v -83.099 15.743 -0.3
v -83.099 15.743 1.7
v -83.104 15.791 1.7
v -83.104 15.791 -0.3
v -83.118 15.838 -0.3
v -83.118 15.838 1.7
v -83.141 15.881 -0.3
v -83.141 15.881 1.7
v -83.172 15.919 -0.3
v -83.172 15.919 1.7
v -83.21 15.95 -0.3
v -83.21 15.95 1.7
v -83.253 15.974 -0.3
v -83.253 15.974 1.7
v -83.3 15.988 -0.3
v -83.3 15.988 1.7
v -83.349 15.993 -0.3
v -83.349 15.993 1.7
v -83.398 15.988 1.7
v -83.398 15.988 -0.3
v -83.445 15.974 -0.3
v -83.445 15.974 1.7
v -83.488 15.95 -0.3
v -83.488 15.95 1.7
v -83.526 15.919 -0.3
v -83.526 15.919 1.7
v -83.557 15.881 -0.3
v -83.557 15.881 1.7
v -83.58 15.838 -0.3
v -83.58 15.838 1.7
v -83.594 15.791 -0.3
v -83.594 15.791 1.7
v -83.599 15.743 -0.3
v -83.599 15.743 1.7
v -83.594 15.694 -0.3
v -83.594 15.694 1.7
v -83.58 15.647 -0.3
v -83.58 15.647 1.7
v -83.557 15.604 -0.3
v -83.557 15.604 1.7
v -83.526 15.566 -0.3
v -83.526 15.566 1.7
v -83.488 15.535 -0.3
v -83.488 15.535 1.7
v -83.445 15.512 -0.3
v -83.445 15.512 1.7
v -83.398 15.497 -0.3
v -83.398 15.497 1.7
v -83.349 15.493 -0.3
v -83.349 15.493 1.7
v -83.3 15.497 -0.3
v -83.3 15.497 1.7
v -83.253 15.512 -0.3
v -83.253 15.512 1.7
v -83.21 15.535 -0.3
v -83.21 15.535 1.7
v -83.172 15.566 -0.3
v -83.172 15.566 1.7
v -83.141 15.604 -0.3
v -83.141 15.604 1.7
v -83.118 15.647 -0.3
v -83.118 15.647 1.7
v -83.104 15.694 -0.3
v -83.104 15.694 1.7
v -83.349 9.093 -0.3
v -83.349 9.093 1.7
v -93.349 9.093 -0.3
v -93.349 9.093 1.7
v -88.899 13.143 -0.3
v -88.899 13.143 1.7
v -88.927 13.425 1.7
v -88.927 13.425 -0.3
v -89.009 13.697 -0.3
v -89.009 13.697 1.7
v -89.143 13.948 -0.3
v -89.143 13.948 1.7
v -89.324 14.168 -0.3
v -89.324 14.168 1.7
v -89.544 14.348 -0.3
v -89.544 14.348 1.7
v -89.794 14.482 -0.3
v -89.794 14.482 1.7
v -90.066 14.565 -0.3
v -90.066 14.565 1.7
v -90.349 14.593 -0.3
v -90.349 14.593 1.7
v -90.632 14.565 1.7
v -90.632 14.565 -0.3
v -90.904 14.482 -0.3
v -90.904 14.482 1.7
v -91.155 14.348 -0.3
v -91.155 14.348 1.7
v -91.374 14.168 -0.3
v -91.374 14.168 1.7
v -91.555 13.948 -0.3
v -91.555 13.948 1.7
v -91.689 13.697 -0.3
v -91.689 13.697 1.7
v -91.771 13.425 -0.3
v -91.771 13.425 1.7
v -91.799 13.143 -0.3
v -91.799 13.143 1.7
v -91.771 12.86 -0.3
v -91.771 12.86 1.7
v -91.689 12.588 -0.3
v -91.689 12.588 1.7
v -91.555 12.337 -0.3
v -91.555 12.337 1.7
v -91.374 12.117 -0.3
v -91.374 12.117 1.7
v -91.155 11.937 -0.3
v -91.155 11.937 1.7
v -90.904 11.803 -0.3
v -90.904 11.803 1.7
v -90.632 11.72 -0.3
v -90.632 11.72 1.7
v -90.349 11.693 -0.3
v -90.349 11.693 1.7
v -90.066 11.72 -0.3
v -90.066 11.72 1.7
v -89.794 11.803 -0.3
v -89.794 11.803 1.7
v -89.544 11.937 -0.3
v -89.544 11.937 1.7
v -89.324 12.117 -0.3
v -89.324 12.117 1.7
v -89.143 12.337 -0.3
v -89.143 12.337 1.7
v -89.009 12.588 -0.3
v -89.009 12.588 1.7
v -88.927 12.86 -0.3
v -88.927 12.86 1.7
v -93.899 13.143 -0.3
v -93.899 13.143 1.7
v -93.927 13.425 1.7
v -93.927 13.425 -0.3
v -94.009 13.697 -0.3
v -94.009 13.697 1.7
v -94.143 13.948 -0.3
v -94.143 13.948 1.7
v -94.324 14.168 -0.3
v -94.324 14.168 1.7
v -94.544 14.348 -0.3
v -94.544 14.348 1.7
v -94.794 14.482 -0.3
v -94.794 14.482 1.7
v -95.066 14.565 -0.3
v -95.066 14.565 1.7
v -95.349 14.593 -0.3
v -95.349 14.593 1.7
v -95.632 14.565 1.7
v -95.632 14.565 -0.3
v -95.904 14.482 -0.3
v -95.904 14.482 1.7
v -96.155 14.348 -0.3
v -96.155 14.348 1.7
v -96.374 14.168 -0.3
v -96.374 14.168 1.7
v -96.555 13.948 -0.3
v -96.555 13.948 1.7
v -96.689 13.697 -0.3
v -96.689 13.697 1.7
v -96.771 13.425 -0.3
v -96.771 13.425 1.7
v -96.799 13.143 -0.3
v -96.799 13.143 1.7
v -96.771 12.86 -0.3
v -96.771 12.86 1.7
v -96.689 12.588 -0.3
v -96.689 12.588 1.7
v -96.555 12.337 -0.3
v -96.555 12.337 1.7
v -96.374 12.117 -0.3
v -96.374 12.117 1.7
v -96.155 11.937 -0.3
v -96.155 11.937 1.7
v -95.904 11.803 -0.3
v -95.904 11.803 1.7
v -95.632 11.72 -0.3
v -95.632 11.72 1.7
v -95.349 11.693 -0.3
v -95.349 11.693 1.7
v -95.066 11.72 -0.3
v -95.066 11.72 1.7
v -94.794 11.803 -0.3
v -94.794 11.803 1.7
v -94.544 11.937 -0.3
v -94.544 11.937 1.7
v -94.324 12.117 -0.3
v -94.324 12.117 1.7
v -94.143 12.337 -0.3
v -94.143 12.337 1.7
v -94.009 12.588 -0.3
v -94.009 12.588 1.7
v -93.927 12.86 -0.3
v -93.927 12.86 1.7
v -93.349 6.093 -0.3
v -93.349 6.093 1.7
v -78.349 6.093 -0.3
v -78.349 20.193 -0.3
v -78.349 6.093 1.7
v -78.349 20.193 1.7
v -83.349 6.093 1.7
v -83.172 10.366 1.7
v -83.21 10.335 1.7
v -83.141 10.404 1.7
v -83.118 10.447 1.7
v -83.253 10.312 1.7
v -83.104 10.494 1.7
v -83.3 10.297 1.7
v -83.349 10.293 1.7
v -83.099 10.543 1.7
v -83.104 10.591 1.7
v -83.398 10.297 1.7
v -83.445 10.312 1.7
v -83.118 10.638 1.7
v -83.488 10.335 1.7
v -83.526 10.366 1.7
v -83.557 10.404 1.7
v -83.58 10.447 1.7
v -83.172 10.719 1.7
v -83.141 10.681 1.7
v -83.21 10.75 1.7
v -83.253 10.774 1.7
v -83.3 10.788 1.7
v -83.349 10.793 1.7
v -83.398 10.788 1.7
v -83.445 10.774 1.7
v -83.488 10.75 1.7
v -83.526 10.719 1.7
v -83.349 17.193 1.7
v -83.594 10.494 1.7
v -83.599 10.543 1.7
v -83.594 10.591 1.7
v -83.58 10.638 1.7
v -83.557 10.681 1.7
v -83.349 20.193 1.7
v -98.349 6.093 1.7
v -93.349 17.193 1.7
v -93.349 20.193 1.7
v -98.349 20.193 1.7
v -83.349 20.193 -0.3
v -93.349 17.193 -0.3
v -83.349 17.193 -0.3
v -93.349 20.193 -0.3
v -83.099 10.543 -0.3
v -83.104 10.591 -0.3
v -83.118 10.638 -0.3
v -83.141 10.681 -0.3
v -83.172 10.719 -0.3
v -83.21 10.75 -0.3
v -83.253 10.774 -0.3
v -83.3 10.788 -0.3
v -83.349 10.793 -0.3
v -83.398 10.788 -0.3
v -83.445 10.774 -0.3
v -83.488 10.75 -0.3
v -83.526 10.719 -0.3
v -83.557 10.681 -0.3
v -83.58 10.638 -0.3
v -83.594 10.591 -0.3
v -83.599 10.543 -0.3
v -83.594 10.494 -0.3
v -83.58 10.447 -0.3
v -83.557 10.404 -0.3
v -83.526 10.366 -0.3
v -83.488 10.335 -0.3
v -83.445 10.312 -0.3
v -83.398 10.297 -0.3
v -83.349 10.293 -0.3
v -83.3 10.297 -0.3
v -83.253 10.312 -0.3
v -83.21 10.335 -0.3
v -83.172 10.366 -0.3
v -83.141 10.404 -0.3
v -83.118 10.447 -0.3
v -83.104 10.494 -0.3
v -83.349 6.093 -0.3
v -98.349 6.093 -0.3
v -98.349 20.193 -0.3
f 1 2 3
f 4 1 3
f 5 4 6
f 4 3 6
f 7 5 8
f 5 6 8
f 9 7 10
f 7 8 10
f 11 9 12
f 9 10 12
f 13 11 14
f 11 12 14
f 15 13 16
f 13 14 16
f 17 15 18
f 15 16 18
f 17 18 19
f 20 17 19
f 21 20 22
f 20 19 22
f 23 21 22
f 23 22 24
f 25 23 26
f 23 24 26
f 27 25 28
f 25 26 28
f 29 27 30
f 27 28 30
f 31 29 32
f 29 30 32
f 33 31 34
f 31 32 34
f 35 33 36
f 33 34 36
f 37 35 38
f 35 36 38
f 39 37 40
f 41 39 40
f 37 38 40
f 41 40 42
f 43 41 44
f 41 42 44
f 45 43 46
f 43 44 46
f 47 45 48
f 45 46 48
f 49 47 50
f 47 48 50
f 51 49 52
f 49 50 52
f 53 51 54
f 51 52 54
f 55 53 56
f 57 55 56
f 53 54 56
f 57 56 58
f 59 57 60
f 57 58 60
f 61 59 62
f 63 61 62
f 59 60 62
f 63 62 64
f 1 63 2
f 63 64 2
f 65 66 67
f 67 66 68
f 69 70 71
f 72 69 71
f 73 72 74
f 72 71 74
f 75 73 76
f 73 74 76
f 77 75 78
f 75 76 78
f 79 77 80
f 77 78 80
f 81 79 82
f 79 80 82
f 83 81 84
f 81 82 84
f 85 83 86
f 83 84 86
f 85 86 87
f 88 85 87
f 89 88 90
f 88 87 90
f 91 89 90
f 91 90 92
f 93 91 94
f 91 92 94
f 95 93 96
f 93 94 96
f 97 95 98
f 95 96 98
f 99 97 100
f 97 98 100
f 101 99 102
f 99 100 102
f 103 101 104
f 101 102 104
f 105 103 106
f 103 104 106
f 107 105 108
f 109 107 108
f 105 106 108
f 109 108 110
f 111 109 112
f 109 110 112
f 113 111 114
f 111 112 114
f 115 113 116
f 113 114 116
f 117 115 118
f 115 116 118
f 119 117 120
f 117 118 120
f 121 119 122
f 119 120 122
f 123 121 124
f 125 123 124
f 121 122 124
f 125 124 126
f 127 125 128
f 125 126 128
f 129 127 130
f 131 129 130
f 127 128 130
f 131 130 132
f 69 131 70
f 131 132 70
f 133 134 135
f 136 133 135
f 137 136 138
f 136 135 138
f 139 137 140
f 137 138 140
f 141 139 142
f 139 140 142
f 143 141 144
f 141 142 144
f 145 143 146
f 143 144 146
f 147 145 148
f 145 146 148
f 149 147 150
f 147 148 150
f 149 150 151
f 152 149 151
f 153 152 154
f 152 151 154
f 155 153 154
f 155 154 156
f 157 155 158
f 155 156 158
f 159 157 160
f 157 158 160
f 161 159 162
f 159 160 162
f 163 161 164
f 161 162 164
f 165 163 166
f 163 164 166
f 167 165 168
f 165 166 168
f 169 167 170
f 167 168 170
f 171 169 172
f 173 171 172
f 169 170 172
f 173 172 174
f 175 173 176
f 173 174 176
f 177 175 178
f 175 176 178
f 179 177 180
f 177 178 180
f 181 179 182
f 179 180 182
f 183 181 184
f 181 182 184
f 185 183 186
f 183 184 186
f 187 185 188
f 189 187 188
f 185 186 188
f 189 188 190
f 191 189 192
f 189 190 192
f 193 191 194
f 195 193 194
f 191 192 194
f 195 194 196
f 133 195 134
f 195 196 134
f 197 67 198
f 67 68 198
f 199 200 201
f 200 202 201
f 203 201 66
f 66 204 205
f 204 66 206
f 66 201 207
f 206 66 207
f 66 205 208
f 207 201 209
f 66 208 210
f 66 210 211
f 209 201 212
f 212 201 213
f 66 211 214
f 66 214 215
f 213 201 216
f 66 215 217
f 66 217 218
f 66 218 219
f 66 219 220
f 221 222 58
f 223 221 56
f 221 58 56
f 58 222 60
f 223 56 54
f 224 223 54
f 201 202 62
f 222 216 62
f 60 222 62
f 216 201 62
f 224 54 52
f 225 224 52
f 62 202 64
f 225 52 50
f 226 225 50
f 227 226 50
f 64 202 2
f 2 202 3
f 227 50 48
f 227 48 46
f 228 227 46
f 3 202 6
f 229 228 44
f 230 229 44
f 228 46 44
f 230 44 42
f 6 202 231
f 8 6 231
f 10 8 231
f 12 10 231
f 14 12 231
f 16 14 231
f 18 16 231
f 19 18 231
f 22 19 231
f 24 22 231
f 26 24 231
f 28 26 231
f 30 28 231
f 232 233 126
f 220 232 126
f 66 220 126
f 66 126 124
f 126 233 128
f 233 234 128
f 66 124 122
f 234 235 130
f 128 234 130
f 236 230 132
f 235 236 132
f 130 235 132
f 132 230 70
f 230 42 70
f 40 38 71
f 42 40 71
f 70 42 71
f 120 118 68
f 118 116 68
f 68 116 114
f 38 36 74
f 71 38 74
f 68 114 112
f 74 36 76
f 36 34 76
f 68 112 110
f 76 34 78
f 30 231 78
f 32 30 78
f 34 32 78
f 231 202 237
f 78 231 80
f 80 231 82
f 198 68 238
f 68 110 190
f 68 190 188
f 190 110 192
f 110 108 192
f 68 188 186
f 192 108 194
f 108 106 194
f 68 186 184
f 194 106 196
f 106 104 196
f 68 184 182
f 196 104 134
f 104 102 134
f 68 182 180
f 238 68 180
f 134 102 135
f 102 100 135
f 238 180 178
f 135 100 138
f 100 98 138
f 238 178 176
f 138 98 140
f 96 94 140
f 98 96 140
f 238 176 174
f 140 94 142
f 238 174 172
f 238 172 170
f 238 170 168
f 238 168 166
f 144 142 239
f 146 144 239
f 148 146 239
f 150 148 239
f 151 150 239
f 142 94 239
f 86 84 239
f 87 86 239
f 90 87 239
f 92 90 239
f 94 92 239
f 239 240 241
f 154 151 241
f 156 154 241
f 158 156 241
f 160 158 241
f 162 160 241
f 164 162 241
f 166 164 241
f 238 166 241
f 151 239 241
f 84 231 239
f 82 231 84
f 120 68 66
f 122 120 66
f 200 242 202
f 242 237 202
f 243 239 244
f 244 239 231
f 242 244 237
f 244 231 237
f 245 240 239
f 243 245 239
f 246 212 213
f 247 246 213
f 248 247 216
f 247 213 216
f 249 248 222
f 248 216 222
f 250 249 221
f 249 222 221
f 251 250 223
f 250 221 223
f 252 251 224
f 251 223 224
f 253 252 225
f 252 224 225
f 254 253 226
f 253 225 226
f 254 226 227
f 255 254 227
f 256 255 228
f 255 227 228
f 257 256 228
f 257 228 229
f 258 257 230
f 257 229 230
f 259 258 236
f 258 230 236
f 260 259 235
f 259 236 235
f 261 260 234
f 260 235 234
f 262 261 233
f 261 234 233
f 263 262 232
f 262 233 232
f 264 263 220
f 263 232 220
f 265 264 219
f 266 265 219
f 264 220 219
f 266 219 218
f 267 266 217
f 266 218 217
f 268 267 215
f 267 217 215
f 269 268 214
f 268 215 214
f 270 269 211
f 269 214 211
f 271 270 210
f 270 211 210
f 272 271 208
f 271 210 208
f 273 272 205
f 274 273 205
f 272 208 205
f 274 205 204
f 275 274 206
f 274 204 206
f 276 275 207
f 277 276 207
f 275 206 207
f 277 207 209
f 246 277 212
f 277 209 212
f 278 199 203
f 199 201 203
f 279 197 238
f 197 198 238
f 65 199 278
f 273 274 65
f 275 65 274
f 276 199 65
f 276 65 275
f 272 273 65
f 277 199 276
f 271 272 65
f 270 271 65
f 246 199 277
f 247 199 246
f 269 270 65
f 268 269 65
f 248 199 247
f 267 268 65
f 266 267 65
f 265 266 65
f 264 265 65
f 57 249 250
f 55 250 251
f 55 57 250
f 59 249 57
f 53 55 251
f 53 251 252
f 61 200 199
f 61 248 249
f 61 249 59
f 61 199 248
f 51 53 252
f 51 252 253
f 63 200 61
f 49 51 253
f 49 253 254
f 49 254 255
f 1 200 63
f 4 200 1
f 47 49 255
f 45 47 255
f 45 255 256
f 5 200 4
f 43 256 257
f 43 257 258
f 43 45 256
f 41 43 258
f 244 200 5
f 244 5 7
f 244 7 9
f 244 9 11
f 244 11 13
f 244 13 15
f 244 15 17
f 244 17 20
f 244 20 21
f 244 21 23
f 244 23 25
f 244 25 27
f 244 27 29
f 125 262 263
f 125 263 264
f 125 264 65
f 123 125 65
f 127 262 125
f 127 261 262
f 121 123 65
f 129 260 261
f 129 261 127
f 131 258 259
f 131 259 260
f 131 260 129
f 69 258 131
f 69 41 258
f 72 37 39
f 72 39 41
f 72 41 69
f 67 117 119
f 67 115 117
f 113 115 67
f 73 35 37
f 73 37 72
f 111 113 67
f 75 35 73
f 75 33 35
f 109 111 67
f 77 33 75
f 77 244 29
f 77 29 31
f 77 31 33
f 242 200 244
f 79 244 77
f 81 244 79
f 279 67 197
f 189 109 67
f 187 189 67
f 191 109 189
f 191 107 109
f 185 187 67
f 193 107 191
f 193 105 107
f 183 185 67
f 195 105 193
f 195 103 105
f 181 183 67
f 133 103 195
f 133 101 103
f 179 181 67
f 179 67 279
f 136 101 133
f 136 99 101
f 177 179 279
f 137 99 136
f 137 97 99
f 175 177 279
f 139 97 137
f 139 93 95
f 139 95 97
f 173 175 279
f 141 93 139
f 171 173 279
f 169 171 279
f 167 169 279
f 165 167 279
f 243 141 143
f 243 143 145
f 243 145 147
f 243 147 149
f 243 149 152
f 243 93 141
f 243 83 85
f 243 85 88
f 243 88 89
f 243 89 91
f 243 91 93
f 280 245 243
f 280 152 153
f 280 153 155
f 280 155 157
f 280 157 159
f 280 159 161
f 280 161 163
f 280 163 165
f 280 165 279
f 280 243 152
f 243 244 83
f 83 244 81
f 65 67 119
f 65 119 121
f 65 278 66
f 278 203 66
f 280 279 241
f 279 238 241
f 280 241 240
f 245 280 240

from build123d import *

# Parameters (mm, degrees)
BOSS_EXTRUDE1_DEPTH = 1.7
BOSS_EXTRUDE4_DEPTH = 0.3
SKETCH6_R           = 1.45
CUT_EXTRUDE1_DEPTH  = 2
SKETCH7_R           = 1.45
CUT_EXTRUDE2_DEPTH  = 2
SKETCH8_R           = 0.25
CUT_EXTRUDE3_DEPTH  = 2
SKETCH9_R           = 0.25
CUT_EXTRUDE4_DEPTH  = 2


with BuildPart() as part:
    # Sketch1 → Boss-Extrude1 (new body)
    with BuildSketch(Plane.XY):
        Polygon((-93.349083219, 17.192602894), (-83.349083219, 17.192602894), (-83.349083219, 20.192602894), (-78.349083219, 20.192602894), (-78.349083219, 6.092602894), (-83.349083219, 6.092602894), (-83.349083219, 9.092602894), (-93.349083219, 9.092602894), (-93.349083219, 6.092602894), (-98.349083219, 6.092602894), (-98.349083219, 20.192602894), (-93.349083219, 20.192602894), align=None)
    extrude(amount=BOSS_EXTRUDE1_DEPTH)

    # Sketch1<4> → Boss-Extrude4 (add)
    with BuildSketch(Plane.XY):
        Polygon((-93.349083219, 17.192602894), (-83.349083219, 17.192602894), (-83.349083219, 20.192602894), (-78.349083219, 20.192602894), (-78.349083219, 6.092602894), (-83.349083219, 6.092602894), (-83.349083219, 9.092602894), (-93.349083219, 9.092602894), (-93.349083219, 6.092602894), (-98.349083219, 6.092602894), (-98.349083219, 20.192602894), (-93.349083219, 20.192602894), align=None)
    extrude(amount=-BOSS_EXTRUDE4_DEPTH)

    # Sketch6 → Cut-Extrude1 (cut)
    with BuildSketch(Plane.XY.offset(1.7)):
        with Locations((-95.349083219, 13.142602894)):
            Circle(SKETCH6_R)
    extrude(amount=-CUT_EXTRUDE1_DEPTH, mode=Mode.SUBTRACT)

    # Sketch7 → Cut-Extrude2 (cut)
    with BuildSketch(Plane.XY.offset(1.7)):
        with Locations((-90.349083219, 13.142602894)):
            Circle(SKETCH7_R)
    extrude(amount=-CUT_EXTRUDE2_DEPTH, mode=Mode.SUBTRACT)

    # Sketch8 → Cut-Extrude3 (cut)
    with BuildSketch(Plane.XY.offset(1.7)):
        with Locations((-83.349083219, 15.742602894)):
            Circle(SKETCH8_R)
    extrude(amount=-CUT_EXTRUDE3_DEPTH, mode=Mode.SUBTRACT)

    # Sketch9 → Cut-Extrude4 (cut)
    with BuildSketch(Plane.XY.offset(1.7)):
        with Locations((-83.349083219, 10.542602894)):
            Circle(SKETCH9_R)
    extrude(amount=-CUT_EXTRUDE4_DEPTH, mode=Mode.SUBTRACT)


solid = part.part
